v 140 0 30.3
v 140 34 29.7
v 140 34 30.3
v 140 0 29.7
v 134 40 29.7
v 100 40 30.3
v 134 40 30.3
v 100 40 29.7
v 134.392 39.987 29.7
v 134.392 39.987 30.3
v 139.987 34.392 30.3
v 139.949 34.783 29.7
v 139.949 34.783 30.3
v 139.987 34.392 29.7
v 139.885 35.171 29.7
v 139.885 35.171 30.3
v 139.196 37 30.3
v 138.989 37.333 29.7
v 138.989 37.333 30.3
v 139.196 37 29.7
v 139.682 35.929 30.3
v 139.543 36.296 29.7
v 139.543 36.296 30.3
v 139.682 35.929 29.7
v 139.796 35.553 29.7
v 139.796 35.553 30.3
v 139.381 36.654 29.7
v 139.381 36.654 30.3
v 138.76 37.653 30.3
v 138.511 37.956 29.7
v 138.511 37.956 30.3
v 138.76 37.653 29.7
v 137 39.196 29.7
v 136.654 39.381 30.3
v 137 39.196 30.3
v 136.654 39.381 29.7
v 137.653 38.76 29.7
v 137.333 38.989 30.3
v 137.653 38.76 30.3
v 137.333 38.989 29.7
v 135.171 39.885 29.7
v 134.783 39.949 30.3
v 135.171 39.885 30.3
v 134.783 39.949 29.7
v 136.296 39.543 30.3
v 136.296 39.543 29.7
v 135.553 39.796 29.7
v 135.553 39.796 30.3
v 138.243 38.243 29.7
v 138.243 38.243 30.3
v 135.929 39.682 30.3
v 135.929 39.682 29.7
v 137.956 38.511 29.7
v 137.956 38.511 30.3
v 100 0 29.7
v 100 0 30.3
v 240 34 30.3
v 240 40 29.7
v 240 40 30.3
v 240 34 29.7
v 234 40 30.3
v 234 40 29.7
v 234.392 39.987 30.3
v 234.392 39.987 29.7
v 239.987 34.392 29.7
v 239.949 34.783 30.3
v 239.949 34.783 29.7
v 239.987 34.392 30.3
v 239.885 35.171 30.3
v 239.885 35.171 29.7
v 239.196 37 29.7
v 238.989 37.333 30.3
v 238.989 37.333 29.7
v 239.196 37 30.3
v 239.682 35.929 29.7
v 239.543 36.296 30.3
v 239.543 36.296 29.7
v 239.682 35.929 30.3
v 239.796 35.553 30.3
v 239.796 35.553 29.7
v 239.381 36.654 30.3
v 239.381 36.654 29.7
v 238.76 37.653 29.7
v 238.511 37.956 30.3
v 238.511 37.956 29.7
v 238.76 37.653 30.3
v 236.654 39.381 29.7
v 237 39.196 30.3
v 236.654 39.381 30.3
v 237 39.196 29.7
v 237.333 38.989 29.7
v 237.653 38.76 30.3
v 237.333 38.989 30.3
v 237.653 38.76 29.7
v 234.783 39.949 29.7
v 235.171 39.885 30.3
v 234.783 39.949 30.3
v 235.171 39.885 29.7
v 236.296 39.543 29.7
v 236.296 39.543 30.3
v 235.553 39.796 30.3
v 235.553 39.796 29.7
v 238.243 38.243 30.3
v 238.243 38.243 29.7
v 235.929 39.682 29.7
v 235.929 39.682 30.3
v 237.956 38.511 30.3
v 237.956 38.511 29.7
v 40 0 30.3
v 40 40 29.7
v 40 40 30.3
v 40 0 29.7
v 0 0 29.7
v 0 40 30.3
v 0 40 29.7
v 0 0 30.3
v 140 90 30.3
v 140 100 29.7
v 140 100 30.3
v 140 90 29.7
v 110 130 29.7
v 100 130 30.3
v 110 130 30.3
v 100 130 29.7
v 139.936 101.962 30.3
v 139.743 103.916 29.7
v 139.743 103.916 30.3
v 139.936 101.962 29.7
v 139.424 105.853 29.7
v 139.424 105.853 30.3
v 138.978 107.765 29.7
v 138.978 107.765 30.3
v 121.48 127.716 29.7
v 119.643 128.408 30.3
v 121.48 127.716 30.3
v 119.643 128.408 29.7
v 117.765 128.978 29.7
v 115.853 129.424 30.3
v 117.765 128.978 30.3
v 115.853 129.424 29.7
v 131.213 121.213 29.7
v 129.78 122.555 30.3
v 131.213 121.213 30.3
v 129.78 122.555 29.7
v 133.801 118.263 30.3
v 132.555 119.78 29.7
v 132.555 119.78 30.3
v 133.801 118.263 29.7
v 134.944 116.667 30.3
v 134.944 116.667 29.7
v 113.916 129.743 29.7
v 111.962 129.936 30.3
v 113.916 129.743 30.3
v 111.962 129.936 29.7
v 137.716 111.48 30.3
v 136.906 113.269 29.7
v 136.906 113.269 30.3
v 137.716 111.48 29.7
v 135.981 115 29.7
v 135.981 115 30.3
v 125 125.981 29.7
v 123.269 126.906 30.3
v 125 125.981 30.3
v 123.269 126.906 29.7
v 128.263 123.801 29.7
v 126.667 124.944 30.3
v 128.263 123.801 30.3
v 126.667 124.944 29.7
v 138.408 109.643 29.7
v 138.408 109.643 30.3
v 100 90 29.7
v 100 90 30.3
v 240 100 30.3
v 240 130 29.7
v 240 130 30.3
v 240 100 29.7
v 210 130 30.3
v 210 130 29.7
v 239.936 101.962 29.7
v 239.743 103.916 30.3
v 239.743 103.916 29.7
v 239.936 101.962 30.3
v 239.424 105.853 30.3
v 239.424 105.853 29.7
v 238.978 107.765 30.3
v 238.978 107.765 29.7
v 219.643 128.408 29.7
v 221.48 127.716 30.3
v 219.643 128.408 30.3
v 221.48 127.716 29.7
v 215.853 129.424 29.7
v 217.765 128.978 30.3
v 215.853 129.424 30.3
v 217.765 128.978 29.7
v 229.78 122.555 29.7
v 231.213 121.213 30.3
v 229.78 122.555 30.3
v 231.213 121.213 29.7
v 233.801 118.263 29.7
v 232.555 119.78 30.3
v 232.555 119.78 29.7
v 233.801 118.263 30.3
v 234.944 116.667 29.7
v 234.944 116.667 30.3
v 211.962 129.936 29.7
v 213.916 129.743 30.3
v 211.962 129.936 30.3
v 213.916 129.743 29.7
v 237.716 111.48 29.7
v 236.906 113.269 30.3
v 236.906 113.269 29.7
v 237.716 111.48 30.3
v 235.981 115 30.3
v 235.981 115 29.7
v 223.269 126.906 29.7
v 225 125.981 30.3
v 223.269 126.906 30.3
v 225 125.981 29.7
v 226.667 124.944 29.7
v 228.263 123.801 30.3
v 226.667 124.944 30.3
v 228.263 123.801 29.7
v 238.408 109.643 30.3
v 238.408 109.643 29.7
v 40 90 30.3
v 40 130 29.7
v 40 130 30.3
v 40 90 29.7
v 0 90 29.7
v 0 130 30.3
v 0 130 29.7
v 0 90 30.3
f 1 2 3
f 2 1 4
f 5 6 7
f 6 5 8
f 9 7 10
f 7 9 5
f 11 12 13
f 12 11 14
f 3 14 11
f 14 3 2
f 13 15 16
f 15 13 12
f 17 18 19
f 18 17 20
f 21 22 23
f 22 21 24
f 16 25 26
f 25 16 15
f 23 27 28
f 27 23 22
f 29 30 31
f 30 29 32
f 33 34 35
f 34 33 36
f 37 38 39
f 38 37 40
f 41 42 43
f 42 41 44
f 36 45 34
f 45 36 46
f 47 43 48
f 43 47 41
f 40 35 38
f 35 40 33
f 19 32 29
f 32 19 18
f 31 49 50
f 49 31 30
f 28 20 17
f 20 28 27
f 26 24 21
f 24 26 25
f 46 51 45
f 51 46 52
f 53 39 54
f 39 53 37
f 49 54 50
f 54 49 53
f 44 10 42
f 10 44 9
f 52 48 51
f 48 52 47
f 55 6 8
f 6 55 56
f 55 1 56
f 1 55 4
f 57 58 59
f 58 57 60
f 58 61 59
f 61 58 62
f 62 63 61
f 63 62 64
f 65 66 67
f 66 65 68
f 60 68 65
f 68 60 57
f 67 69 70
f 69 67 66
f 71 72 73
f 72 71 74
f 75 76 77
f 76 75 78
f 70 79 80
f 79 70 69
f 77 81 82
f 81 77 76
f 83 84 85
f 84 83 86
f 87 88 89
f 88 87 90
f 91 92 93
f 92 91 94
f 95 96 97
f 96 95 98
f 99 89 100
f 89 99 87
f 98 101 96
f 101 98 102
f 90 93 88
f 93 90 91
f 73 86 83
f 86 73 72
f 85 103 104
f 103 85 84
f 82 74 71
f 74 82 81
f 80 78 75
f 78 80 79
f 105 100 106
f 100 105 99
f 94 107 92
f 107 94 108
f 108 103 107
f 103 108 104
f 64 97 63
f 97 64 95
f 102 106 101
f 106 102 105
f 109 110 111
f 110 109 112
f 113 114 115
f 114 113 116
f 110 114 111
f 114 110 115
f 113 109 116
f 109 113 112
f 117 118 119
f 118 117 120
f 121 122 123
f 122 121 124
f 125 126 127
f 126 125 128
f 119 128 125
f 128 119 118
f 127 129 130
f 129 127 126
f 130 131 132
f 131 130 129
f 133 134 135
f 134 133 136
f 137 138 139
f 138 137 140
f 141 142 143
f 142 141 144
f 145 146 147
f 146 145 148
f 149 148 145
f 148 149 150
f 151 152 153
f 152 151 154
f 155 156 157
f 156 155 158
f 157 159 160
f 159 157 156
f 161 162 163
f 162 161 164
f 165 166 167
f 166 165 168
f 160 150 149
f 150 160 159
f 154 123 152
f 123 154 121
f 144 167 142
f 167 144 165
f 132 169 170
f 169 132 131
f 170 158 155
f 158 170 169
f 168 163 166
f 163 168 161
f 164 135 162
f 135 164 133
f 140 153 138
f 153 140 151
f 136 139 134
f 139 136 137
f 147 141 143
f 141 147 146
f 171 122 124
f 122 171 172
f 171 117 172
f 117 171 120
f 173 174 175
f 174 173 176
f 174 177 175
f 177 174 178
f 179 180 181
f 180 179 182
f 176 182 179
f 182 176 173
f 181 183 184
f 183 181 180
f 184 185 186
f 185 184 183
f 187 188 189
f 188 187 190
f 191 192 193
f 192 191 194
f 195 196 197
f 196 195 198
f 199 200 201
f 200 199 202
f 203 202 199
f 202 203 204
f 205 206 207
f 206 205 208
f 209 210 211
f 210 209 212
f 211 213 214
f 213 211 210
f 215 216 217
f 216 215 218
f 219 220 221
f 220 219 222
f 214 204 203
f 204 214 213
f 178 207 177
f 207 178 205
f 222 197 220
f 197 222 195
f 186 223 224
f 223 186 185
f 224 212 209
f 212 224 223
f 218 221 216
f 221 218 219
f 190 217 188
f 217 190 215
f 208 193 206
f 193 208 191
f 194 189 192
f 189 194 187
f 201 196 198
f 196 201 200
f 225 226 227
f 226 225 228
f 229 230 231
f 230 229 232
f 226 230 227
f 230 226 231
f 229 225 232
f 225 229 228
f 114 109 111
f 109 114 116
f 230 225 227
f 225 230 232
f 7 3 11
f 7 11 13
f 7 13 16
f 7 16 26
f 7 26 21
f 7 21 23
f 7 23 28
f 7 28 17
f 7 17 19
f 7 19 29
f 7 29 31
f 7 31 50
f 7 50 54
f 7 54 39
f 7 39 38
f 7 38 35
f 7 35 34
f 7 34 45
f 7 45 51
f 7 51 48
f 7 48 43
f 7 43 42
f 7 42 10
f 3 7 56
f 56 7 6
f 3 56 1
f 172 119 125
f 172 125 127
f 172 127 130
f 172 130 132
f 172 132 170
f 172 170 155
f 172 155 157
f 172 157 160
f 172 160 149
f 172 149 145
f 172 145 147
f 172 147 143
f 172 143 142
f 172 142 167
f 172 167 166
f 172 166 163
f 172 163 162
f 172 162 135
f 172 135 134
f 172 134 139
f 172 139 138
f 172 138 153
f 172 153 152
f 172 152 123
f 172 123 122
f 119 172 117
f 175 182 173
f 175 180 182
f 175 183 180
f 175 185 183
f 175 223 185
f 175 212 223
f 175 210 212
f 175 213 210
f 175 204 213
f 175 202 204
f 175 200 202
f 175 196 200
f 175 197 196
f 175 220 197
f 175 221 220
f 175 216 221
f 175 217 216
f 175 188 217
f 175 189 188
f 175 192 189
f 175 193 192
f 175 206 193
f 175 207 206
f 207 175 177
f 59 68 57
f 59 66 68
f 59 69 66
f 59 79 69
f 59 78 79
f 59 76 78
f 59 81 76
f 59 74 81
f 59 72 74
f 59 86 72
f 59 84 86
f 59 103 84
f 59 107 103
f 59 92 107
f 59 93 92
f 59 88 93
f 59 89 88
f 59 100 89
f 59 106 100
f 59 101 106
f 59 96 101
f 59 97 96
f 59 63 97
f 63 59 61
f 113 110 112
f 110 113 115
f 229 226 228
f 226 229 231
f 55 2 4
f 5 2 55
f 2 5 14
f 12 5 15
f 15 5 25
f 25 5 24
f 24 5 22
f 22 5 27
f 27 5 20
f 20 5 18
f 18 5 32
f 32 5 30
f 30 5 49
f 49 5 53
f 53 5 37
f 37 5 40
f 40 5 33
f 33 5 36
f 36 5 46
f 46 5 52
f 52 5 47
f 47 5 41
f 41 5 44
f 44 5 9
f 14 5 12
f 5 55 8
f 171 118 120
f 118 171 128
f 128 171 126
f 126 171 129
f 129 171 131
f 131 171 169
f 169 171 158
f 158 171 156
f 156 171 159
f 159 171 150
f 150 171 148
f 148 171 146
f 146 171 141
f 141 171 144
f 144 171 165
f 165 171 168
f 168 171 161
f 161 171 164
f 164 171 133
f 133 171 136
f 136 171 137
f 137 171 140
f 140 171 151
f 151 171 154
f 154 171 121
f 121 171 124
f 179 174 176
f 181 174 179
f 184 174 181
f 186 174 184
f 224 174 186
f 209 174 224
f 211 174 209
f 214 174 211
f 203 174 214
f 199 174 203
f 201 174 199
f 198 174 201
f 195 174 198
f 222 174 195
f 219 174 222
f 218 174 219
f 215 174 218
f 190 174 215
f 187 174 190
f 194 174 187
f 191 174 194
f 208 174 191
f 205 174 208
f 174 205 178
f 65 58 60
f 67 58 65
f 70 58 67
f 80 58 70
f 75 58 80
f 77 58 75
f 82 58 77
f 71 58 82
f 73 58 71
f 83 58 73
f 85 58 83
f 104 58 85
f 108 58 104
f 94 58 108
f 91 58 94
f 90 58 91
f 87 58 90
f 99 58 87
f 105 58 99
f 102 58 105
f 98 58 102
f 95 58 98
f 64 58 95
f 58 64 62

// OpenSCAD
// file: _fillet_ref.scad
// -----------------------------------------------------------------------------
// M1 visual harness — shared reference tools + cross-cut viewer
//
// These are HAND-WRITTEN reference fillet/round/chamfer tools built from the
// classic OpenSCAD idioms (annulus - torus, wedge - cylinder, ...). They do NOT
// depend on the fillet_tool/round_tool nodes, so they render today and give the
// known-good target that later milestones (M5, M7) must reproduce.
//
// Convention for every case: geometry is built so the feature EDGE runs along Z,
// and we take a thin-slab horizontal cross-section (normal +Z). One image then
// shows, side by side along X:
//     [ base model ] [ applied result ] [ isolated tool solid ]
// and, stacked along Y, a small radius and a large radius (>= surface extent).
// -----------------------------------------------------------------------------

// Thin-slab section: intersect children with a thin horizontal slab at height z.
// XY size is deliberately huge so it covers the whole laid-out scene; only z and
// thickness matter for what the section shows.
module fillet_section(z = 0, thickness = 0.6, extent = 4000) {
  intersection() {
    children();
    translate([0, 0, z]) cube([extent, extent, thickness], center = true);
  }
}

// Vertical thin-slab section (normal +Y), for axis-symmetric ring features where
// a cut through the axis shows the rho-z profile and the ring fillet on both sides.
module fillet_vsection(y = 0, thickness = 0.6, extent = 4000) {
  intersection() {
    children();
    translate([0, y, 0]) cube([extent, thickness, extent], center = true);
  }
}

// Stack several thin-slab sections at different heights, translated apart along
// +Y so the section EVOLVING toward a junction is visible at a glance (used for
// the 3-/4-face meeting-point cases).
module fillet_contour_stack(zs, thickness = 0.6, spacing = 90, extent = 4000) {
  for (i = [0 : len(zs) - 1])
    translate([0, i * spacing, 0])
      fillet_section(z = zs[i], thickness = thickness, extent = extent)
        children();
}

// ---- reference tools for a single 90-degree edge running along Z -------------

// Inner (concave) fillet bead. Faces are x = cx (material x < cx) and y = cy
// (material y < cy); the reentrant quadrant opens toward +x,+y. Union this with
// the model. Cross-section = corner square minus a quarter disc (= a fillet).
module ref_fillet_edge_z(cx, cy, r, h, z0 = 0) {
  translate([0, 0, z0])
    difference() {
      translate([cx, cy, 0]) cube([r, r, h]);
      translate([cx + r, cy + r, -1]) cylinder(r = r, h = h + 2);
    }
}

// Outer (convex) round tool. Convex corner at (cx,cy), material x < cx & y < cy.
// SUBTRACT this from the model; it is the sharp corner sliver outside the arc.
module ref_round_edge_z(cx, cy, r, h, z0 = 0) {
  translate([0, 0, z0])
    difference() {
      translate([cx - r, cy - r, 0]) cube([r, r, h]);
      translate([cx - r, cy - r, -1]) cylinder(r = r, h = h + 2);
    }
}

// Inner (concave) chamfer bead — the wedge alone, no arc. Union with the model.
module ref_chamfer_edge_z(cx, cy, t, h, z0 = 0) {
  translate([0, 0, z0])
    linear_extrude(h)
      polygon([[cx, cy], [cx + t, cy], [cx, cy + t]]);
}
// main file
// Case C — outer vertical edge of a cube, a CONVEX 90-degree edge -> round_tool
// (the caller subtracts). Edge along Z.
//
// Top-view thin-slab section at z = 30:
//   columns -> [ base model ] [ applied (edge rounded) ] [ isolated tool ]
//   rows    -> round r=small, round r=large

include <_fillet_ref.scad>;

$fn = 96;

S  = 40;    // cube side
H  = 60;    // height along Z
dx = 100;   // column spacing
dy = 90;    // row spacing

r_small = 6;
r_large = 30;

module box() { cube([S, S, H]); }   // convex edge at (S,S) along Z

module tool(r) { ref_round_edge_z(S, S, r, H); }

module row(r) {
  box();
  translate([dx, 0, 0])     difference() { box(); tool(r); }   // applied
  translate([2 * dx, 0, 0]) tool(r);                          // isolated tool
}

fillet_section(z = H / 2) {
  translate([0, 0 * dy, 0]) row(r_small);
  translate([0, 1 * dy, 0]) row(r_large);
}
